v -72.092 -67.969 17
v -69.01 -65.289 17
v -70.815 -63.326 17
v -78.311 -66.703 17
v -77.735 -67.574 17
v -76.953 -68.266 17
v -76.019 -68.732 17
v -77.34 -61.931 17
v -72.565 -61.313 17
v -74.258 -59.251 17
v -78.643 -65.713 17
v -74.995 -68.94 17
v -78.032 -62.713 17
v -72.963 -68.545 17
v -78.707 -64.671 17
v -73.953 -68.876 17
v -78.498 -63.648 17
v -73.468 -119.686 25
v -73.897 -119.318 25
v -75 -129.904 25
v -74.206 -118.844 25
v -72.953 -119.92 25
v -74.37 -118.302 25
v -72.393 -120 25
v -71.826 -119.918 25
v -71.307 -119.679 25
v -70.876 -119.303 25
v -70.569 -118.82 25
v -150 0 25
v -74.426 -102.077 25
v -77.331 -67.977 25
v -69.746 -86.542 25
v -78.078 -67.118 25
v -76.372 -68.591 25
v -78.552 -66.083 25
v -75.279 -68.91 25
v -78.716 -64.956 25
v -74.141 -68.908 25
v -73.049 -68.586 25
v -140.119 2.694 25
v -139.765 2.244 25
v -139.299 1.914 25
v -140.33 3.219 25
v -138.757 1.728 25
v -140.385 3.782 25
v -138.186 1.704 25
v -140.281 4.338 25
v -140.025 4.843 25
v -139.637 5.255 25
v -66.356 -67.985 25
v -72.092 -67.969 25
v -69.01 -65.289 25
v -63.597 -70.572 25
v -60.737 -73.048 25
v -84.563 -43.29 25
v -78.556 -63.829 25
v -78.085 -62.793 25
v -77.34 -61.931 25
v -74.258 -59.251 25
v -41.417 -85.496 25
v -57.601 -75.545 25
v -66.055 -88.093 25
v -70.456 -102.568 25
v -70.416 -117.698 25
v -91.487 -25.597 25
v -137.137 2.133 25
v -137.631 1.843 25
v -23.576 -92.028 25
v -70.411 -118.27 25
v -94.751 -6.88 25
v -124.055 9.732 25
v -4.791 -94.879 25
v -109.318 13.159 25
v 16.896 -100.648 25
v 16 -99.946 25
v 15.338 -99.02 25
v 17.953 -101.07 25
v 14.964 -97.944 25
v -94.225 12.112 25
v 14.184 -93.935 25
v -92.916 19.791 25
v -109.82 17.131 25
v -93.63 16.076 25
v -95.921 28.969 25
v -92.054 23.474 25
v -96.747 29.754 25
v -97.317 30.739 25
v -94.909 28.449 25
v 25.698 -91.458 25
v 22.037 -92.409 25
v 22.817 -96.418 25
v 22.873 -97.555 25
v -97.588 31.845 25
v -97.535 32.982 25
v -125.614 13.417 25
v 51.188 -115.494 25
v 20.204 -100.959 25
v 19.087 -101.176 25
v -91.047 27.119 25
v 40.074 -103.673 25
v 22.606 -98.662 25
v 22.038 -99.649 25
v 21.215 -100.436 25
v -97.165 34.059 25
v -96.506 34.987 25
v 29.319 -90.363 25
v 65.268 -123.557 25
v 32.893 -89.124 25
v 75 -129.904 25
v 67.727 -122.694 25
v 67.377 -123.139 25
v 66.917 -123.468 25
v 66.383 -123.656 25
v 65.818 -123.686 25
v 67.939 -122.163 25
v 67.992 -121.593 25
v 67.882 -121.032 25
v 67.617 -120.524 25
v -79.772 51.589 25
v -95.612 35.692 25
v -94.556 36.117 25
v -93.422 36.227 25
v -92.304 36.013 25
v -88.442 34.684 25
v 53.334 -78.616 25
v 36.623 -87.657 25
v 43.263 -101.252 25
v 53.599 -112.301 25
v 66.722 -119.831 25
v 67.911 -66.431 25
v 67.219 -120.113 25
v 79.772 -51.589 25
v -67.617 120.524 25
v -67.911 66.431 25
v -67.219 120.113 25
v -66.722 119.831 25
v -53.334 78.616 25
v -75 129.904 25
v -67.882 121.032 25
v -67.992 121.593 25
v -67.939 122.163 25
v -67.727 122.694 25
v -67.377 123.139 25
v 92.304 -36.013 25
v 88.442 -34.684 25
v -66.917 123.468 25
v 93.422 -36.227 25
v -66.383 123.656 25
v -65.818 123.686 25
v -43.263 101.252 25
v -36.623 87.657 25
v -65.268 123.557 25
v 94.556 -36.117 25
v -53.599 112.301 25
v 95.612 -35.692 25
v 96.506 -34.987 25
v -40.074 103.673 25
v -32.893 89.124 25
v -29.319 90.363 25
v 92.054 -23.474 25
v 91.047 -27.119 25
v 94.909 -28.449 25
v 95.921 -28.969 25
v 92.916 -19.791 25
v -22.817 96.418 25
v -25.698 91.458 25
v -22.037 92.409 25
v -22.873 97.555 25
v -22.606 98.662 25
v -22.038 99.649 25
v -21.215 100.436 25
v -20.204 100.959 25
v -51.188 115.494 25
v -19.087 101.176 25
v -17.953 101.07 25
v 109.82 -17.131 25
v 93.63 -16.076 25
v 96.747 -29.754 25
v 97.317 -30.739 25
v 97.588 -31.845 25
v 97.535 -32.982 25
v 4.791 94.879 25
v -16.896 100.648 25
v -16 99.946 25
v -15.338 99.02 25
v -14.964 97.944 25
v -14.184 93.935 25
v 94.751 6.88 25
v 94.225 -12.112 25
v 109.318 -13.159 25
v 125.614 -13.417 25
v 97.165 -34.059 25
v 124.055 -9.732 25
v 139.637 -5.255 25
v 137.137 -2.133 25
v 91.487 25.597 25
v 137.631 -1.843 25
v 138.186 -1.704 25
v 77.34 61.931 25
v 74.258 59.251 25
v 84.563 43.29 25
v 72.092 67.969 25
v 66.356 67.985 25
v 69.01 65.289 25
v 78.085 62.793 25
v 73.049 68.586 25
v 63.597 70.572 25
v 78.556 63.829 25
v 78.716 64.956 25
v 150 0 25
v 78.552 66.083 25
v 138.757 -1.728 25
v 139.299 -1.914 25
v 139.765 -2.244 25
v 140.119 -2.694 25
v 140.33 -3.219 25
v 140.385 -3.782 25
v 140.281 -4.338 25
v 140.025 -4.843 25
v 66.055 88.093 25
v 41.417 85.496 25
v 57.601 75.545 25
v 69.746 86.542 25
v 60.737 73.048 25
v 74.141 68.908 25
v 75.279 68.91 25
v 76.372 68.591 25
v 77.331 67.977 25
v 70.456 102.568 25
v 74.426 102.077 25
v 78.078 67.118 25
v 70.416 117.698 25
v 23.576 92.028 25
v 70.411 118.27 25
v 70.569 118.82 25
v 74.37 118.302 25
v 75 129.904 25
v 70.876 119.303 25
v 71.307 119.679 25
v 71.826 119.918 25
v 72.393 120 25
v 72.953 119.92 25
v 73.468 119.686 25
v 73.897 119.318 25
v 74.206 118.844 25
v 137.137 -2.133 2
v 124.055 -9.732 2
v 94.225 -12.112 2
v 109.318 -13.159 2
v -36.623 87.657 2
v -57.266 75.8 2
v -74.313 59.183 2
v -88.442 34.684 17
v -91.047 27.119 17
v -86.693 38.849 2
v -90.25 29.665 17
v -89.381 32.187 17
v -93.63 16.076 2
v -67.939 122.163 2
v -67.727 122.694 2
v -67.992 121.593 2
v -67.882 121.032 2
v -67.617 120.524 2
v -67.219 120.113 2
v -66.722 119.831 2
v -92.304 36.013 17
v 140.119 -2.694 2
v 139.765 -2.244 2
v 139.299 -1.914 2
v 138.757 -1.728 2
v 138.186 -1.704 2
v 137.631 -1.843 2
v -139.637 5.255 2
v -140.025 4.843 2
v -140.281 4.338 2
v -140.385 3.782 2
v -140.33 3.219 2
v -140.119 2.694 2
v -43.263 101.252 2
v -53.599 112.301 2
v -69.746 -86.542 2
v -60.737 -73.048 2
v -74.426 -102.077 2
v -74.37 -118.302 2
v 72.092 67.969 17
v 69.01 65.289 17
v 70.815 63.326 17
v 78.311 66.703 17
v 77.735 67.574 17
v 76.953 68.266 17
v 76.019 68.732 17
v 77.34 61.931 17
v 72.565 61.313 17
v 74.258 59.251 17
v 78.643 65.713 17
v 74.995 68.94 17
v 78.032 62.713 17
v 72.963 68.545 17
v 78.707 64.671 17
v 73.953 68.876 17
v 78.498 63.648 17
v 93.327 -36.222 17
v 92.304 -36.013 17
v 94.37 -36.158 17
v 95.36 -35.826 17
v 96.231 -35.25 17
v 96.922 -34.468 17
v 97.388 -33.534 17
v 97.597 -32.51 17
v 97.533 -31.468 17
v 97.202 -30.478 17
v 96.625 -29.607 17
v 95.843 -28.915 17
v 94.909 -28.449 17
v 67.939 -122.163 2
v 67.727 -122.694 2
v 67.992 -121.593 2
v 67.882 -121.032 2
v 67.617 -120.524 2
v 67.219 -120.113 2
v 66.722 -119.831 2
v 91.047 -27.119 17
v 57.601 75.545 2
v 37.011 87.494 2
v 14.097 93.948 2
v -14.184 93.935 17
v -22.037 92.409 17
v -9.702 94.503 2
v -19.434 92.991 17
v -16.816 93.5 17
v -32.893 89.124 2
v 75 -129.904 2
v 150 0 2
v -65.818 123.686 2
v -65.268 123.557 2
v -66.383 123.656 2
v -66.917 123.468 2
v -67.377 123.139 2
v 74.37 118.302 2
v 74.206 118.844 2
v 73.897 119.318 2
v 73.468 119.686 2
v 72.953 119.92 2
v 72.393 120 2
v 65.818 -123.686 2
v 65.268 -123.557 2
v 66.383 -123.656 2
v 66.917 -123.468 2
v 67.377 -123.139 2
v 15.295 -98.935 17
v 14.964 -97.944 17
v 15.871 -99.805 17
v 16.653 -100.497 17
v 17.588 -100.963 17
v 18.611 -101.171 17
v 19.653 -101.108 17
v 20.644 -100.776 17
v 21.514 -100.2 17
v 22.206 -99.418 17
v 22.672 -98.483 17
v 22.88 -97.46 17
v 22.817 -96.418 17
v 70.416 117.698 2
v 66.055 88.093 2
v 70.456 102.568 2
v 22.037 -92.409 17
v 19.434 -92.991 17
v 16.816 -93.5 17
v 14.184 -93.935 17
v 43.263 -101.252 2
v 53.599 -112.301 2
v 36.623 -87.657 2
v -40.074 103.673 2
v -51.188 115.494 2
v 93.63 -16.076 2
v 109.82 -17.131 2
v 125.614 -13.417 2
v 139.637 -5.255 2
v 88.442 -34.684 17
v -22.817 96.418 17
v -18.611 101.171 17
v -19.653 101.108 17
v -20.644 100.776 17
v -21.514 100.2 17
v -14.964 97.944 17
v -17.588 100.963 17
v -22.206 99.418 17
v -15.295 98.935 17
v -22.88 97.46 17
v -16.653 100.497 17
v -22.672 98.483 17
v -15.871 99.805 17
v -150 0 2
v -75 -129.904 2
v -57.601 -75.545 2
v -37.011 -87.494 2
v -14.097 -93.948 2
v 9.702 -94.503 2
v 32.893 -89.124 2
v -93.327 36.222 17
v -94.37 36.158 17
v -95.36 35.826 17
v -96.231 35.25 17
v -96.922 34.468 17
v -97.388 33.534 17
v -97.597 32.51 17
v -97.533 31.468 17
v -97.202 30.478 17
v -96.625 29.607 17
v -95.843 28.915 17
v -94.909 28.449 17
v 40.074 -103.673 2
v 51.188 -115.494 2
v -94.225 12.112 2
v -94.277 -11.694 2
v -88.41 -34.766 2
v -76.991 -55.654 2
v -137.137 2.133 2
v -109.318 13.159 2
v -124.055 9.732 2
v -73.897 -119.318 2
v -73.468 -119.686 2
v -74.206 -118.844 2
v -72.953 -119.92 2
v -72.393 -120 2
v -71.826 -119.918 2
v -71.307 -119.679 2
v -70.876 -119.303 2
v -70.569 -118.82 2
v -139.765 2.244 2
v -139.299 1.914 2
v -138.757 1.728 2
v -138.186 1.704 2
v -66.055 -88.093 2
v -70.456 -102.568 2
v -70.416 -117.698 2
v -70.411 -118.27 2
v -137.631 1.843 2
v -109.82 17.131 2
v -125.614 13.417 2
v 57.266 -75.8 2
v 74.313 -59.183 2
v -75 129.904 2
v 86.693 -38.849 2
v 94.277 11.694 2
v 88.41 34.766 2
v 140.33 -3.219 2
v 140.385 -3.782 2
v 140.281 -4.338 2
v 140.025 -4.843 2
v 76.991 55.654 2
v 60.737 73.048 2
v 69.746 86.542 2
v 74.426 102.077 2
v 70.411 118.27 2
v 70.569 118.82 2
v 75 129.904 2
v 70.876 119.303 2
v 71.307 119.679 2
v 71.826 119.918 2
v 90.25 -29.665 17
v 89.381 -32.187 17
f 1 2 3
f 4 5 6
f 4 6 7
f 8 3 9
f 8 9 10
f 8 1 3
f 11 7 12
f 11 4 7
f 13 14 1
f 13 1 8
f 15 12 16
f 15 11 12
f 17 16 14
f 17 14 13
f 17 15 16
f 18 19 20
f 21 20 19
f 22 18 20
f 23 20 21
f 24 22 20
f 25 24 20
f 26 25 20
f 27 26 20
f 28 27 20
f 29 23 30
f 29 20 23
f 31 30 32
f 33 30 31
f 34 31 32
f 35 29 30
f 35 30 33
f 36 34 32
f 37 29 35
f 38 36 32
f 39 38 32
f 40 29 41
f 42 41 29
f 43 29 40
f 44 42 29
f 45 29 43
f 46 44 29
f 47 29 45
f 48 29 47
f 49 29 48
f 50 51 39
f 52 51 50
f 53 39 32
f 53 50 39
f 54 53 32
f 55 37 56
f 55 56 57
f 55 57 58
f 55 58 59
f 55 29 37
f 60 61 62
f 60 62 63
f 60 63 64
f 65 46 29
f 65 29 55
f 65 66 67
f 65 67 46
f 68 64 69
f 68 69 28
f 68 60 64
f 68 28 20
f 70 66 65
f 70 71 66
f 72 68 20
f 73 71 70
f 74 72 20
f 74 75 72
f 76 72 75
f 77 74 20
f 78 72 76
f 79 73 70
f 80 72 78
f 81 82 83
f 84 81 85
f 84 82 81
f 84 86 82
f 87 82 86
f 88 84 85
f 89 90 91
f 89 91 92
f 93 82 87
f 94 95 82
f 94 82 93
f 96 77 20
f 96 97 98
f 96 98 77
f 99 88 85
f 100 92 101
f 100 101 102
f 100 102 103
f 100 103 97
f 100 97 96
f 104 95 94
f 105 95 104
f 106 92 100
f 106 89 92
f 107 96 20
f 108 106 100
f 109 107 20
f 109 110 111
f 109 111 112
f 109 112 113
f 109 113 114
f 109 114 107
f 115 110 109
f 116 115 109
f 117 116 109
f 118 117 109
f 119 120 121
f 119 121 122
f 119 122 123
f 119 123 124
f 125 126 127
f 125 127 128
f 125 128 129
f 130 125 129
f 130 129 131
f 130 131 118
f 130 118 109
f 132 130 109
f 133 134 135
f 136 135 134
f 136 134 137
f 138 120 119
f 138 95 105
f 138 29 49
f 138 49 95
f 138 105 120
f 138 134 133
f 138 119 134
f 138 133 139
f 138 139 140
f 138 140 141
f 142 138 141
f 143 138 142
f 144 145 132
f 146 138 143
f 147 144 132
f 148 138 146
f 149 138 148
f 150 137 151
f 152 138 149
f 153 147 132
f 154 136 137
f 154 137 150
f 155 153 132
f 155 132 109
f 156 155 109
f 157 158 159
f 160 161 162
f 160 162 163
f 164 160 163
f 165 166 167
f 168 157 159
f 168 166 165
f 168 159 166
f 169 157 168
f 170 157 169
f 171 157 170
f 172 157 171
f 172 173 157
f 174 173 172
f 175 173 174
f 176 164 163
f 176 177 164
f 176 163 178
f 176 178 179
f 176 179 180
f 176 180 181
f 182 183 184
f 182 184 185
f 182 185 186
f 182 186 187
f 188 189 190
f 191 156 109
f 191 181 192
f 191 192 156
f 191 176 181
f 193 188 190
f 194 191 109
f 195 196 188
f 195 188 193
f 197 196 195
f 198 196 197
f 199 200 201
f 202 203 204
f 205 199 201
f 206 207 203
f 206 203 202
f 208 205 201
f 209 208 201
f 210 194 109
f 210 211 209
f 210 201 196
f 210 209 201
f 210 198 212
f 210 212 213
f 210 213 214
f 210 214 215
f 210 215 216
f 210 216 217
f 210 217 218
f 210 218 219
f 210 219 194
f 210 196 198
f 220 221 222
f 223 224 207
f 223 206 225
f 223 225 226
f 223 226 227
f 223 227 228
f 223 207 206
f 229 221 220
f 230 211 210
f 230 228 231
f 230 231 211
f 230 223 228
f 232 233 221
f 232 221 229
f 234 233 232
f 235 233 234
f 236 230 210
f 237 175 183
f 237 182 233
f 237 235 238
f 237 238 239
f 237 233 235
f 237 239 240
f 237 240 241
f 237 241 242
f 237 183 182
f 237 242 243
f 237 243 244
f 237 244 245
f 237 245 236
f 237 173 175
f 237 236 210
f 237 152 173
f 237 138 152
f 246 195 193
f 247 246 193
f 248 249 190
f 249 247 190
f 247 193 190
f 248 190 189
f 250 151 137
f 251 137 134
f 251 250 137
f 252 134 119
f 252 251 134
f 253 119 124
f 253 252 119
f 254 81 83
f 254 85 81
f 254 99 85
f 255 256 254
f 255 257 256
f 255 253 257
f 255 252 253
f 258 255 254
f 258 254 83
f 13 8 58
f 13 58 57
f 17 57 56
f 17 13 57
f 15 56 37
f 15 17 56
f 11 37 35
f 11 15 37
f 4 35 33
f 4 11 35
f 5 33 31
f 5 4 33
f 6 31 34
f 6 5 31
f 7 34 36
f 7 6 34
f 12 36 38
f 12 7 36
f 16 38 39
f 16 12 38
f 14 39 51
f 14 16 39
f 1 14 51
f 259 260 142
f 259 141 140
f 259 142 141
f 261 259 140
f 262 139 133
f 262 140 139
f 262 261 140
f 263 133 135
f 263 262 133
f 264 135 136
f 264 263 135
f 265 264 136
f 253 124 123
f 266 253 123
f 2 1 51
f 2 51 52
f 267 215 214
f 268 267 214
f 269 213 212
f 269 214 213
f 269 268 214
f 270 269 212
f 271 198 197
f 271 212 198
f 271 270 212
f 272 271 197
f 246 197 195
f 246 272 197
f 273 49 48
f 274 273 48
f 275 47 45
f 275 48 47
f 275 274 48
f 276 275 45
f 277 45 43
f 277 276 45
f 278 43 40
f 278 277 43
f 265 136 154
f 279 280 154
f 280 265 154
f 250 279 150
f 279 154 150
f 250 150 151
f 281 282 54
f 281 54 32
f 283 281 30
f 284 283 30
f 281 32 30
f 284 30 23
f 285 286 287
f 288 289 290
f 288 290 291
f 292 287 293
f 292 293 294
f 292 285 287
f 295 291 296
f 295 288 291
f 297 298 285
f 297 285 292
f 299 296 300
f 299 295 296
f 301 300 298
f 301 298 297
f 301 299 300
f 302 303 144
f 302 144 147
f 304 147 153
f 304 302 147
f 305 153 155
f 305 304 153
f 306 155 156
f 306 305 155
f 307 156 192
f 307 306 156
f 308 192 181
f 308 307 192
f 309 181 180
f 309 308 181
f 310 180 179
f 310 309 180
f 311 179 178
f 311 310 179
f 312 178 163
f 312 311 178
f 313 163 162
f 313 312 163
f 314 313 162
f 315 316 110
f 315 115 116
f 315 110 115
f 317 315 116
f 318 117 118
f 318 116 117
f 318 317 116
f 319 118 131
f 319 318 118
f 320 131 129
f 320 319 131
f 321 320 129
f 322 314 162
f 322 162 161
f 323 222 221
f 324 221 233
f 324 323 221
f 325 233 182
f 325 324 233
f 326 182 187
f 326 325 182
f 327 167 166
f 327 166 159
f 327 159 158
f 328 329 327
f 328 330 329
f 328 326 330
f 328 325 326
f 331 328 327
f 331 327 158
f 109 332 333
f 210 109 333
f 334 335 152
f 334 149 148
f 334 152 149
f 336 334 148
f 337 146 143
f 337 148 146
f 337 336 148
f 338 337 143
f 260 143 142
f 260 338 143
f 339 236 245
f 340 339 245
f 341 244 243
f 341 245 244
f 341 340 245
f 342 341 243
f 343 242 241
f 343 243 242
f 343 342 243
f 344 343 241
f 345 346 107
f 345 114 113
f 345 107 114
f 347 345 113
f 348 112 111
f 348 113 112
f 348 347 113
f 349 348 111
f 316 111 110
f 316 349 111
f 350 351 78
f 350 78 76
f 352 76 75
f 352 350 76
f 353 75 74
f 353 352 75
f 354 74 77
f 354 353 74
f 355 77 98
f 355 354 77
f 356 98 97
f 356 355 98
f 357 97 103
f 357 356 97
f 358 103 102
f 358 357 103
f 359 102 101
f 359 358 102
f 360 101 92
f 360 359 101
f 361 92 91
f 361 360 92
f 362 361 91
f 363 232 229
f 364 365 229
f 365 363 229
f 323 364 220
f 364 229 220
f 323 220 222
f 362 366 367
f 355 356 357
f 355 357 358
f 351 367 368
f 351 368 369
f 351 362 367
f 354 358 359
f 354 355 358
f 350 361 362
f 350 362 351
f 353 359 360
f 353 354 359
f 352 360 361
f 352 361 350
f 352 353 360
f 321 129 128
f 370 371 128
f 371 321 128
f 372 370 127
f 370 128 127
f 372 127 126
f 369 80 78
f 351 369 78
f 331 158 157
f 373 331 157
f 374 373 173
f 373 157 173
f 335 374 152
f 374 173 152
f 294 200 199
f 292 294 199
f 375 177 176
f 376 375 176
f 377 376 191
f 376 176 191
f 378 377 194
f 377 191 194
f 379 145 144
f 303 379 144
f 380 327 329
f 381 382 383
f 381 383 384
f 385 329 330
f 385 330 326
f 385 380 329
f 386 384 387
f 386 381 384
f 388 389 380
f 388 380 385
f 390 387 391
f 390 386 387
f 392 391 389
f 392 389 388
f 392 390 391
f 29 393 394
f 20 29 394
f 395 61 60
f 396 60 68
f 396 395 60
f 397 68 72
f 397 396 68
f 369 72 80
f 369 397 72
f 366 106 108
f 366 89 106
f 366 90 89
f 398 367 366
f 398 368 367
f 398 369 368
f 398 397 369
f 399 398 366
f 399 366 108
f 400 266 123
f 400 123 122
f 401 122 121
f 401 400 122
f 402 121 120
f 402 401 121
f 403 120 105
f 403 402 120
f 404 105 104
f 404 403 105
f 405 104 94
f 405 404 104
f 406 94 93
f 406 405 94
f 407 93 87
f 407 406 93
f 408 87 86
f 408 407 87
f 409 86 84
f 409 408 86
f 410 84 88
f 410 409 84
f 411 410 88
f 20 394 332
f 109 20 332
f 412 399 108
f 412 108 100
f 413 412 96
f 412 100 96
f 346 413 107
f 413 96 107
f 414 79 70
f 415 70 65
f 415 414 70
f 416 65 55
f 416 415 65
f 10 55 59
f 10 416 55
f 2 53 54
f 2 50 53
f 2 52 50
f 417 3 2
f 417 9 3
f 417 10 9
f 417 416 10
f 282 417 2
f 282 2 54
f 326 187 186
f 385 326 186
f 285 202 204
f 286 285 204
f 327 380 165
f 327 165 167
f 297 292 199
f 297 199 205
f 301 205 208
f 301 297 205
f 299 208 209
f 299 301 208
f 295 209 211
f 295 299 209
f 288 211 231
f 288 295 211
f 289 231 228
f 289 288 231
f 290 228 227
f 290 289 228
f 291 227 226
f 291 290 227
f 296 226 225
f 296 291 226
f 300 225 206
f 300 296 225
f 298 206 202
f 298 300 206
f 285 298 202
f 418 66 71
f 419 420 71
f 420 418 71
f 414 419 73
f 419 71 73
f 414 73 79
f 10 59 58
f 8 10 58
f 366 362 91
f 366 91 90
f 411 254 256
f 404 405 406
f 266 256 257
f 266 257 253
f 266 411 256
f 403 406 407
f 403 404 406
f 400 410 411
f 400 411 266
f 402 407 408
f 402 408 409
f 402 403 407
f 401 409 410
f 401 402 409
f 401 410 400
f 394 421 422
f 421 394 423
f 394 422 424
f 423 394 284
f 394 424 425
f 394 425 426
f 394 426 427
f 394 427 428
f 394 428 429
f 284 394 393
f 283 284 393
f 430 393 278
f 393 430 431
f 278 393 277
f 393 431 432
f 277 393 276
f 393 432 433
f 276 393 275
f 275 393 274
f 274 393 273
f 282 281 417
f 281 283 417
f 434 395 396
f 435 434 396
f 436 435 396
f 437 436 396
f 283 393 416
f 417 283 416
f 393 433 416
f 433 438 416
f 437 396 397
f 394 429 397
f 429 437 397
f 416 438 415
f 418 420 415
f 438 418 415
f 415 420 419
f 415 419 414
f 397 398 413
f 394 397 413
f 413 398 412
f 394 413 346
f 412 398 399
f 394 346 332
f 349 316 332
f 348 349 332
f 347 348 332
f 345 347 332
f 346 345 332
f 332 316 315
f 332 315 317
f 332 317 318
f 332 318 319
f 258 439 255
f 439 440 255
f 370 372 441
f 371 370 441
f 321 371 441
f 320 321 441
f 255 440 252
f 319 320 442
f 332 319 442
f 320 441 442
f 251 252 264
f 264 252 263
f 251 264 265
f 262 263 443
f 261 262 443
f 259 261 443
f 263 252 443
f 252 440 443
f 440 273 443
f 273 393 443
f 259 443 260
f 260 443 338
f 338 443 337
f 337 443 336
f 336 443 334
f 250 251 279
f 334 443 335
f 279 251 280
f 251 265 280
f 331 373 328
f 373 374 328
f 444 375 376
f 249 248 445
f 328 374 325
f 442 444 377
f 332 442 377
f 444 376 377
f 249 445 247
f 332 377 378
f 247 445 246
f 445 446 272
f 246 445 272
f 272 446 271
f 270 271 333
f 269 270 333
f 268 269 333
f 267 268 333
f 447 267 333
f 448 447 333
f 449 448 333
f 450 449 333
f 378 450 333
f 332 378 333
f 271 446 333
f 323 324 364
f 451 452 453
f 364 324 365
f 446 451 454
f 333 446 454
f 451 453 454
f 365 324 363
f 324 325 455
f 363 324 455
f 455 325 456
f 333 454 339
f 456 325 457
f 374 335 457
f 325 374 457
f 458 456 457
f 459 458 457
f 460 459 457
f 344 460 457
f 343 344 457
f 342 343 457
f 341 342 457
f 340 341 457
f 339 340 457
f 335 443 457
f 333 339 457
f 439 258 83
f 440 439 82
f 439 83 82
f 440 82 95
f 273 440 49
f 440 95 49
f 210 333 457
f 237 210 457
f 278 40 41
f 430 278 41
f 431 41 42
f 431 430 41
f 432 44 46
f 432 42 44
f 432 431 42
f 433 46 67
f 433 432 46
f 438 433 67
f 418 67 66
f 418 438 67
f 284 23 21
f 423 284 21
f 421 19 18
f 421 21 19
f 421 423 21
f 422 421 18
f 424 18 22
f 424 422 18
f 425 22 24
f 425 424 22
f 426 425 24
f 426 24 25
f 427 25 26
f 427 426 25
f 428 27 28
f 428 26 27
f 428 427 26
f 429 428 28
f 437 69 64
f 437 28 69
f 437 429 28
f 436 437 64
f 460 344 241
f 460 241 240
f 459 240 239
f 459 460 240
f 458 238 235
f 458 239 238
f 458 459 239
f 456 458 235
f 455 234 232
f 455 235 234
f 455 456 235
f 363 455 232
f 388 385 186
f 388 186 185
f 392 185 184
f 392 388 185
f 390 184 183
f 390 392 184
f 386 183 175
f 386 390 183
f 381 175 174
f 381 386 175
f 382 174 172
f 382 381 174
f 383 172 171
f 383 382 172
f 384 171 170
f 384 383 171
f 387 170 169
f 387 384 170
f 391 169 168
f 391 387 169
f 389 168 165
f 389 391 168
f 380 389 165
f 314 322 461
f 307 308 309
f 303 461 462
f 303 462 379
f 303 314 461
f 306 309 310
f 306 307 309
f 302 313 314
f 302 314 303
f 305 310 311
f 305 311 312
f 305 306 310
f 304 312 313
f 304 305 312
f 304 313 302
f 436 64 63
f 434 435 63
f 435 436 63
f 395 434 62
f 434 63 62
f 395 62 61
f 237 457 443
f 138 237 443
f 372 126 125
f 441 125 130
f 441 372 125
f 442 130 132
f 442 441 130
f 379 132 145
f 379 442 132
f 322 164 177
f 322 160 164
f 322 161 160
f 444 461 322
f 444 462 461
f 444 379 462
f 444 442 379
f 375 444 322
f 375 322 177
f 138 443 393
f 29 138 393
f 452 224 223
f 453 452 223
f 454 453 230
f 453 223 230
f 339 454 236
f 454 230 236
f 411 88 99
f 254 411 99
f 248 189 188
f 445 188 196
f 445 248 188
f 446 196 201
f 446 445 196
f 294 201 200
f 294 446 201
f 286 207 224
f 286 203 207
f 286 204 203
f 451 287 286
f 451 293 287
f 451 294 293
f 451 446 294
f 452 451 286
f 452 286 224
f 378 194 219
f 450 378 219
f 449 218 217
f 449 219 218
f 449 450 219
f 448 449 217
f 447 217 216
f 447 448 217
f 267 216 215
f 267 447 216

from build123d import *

# Parameters (mm, degrees)
F2_START      = 2
F0_R          = 95
F2_DEPTH      = 23
F4_DEPTH      = 35
F4_DEPTH_BACK = 10
F5_COUNT      = 6
F8_DEPTH      = 8
F8_DEPTH_BACK = 10
F9_COUNT      = 6


with BuildPart() as f2:
    # F0 (on Top) → F2 (new body)
    with BuildSketch(Plane.XY.offset(F2_START)):
        Polygon((75, 129.9038105677), (-75, 129.9038105677), (-150, 0), (-75, -129.9038105677), (75, -129.9038105677), (150, 0), align=None)
        Circle(F0_R, mode=Mode.SUBTRACT)
    extrude(amount=F2_DEPTH)


with BuildPart() as f4:
    # F3 (on Top) → F4 (new body, two sides)
    with BuildSketch(Plane.XY) as f4_sk:
        with BuildLine():
            ThreePointArc((-34.5435296861, 77.6643068393), (-32.6327882373, 78.4863117484), (-30.7025049427, 79.2613158498))
            ThreePointArc((-30.7025049427, 79.2613158498), (-41.9019572207, 106.1559598637), (-65.2675230757, 123.5571075336))
            ThreePointArc((-65.2675230757, 123.5571075336), (-66.656996648, 123.5810891624), (-67.7266746593, 122.6939584625))
            ThreePointArc((-67.7266746593, 122.6939584625), (-67.8817545517, 121.0315856662), (-66.7217246277, 119.8308093913))
            ThreePointArc((-66.7217246277, 119.8308093913), (-44.7195832857, 103.2599332678), (-34.5435296861, 77.6643068393))
        make_face()
    extrude(amount=F4_DEPTH)
    extrude(f4_sk.sketch, amount=-F4_DEPTH_BACK)


with BuildPart() as f5_1:
    # F5: instance of F4
    add(f4.part.rotate(Axis((0, 0, -0.1854561269), (0, 0, 1)), 1 * 360 / F5_COUNT))


with BuildPart() as f5_2:
    # F5: instance of F4
    add(f4.part.rotate(Axis((0, 0, -0.1854561269), (0, 0, 1)), 2 * 360 / F5_COUNT))


with BuildPart() as f5_3:
    # F5: instance of F4
    add(f4.part.rotate(Axis((0, 0, -0.1854561269), (0, 0, 1)), 3 * 360 / F5_COUNT))


with BuildPart() as f5_4:
    # F5: instance of F4
    add(f4.part.rotate(Axis((0, 0, -0.1854561269), (0, 0, 1)), 4 * 360 / F5_COUNT))


with BuildPart() as f5_5:
    # F5: instance of F4
    add(f4.part.rotate(Axis((0, 0, -0.1854561269), (0, 0, 1)), 5 * 360 / F5_COUNT))


with BuildPart() as f2_1:
    add(f2.part)

    # F6: cut F4, F5_5, F5_4, F5_3, F5_2, F5_1
    add(f4.part, mode=Mode.SUBTRACT)
    add(f5_5.part, mode=Mode.SUBTRACT)
    add(f5_4.part, mode=Mode.SUBTRACT)
    add(f5_3.part, mode=Mode.SUBTRACT)
    add(f5_2.part, mode=Mode.SUBTRACT)
    add(f5_1.part, mode=Mode.SUBTRACT)

    # F9: F8 ×6 about axis
    f9_axis = Axis((0, 0, -0.1854561269), (0, 0, 1))


with BuildPart() as f8:
    # F7 (on face) → F8 (new body, two sides)
    with BuildSketch(Plane.XY.offset(25)) as f8_sk:
        with BuildLine():
            ThreePointArc((-14.9635818085, 97.9443271428), (-16.6533189284, 100.4972414515), (-19.6533265238, 101.1075998951))
            ThreePointArc((-19.6533265238, 101.1075998951), (-22.2062408325, 99.4178627752), (-22.8165992761, 96.4178551798))
            Line((-22.8165992761, 96.4178551798), (-20.6971664161, 85.5143183486))
            Line((-20.6971664161, 85.5143183486), (-16.7706576823, 86.2775543301))
            Line((-16.7706576823, 86.2775543301), (-12.8441489485, 87.0407903117))
            Line((-12.8441489485, 87.0407903117), (-14.9635818085, 97.9443271428))
        make_face()
    extrude(amount=-F8_DEPTH)
    extrude(f8_sk.sketch, amount=F8_DEPTH_BACK)


with BuildPart() as f2_2:
    add(f2_1.part)
    for i in range(1, F9_COUNT):
        add(f8.part.rotate(f9_axis, i * 360 / F9_COUNT), mode=Mode.SUBTRACT)

    # F9#seed: cut F8
    add(f8.part, mode=Mode.SUBTRACT)


solid = f2_2.part
